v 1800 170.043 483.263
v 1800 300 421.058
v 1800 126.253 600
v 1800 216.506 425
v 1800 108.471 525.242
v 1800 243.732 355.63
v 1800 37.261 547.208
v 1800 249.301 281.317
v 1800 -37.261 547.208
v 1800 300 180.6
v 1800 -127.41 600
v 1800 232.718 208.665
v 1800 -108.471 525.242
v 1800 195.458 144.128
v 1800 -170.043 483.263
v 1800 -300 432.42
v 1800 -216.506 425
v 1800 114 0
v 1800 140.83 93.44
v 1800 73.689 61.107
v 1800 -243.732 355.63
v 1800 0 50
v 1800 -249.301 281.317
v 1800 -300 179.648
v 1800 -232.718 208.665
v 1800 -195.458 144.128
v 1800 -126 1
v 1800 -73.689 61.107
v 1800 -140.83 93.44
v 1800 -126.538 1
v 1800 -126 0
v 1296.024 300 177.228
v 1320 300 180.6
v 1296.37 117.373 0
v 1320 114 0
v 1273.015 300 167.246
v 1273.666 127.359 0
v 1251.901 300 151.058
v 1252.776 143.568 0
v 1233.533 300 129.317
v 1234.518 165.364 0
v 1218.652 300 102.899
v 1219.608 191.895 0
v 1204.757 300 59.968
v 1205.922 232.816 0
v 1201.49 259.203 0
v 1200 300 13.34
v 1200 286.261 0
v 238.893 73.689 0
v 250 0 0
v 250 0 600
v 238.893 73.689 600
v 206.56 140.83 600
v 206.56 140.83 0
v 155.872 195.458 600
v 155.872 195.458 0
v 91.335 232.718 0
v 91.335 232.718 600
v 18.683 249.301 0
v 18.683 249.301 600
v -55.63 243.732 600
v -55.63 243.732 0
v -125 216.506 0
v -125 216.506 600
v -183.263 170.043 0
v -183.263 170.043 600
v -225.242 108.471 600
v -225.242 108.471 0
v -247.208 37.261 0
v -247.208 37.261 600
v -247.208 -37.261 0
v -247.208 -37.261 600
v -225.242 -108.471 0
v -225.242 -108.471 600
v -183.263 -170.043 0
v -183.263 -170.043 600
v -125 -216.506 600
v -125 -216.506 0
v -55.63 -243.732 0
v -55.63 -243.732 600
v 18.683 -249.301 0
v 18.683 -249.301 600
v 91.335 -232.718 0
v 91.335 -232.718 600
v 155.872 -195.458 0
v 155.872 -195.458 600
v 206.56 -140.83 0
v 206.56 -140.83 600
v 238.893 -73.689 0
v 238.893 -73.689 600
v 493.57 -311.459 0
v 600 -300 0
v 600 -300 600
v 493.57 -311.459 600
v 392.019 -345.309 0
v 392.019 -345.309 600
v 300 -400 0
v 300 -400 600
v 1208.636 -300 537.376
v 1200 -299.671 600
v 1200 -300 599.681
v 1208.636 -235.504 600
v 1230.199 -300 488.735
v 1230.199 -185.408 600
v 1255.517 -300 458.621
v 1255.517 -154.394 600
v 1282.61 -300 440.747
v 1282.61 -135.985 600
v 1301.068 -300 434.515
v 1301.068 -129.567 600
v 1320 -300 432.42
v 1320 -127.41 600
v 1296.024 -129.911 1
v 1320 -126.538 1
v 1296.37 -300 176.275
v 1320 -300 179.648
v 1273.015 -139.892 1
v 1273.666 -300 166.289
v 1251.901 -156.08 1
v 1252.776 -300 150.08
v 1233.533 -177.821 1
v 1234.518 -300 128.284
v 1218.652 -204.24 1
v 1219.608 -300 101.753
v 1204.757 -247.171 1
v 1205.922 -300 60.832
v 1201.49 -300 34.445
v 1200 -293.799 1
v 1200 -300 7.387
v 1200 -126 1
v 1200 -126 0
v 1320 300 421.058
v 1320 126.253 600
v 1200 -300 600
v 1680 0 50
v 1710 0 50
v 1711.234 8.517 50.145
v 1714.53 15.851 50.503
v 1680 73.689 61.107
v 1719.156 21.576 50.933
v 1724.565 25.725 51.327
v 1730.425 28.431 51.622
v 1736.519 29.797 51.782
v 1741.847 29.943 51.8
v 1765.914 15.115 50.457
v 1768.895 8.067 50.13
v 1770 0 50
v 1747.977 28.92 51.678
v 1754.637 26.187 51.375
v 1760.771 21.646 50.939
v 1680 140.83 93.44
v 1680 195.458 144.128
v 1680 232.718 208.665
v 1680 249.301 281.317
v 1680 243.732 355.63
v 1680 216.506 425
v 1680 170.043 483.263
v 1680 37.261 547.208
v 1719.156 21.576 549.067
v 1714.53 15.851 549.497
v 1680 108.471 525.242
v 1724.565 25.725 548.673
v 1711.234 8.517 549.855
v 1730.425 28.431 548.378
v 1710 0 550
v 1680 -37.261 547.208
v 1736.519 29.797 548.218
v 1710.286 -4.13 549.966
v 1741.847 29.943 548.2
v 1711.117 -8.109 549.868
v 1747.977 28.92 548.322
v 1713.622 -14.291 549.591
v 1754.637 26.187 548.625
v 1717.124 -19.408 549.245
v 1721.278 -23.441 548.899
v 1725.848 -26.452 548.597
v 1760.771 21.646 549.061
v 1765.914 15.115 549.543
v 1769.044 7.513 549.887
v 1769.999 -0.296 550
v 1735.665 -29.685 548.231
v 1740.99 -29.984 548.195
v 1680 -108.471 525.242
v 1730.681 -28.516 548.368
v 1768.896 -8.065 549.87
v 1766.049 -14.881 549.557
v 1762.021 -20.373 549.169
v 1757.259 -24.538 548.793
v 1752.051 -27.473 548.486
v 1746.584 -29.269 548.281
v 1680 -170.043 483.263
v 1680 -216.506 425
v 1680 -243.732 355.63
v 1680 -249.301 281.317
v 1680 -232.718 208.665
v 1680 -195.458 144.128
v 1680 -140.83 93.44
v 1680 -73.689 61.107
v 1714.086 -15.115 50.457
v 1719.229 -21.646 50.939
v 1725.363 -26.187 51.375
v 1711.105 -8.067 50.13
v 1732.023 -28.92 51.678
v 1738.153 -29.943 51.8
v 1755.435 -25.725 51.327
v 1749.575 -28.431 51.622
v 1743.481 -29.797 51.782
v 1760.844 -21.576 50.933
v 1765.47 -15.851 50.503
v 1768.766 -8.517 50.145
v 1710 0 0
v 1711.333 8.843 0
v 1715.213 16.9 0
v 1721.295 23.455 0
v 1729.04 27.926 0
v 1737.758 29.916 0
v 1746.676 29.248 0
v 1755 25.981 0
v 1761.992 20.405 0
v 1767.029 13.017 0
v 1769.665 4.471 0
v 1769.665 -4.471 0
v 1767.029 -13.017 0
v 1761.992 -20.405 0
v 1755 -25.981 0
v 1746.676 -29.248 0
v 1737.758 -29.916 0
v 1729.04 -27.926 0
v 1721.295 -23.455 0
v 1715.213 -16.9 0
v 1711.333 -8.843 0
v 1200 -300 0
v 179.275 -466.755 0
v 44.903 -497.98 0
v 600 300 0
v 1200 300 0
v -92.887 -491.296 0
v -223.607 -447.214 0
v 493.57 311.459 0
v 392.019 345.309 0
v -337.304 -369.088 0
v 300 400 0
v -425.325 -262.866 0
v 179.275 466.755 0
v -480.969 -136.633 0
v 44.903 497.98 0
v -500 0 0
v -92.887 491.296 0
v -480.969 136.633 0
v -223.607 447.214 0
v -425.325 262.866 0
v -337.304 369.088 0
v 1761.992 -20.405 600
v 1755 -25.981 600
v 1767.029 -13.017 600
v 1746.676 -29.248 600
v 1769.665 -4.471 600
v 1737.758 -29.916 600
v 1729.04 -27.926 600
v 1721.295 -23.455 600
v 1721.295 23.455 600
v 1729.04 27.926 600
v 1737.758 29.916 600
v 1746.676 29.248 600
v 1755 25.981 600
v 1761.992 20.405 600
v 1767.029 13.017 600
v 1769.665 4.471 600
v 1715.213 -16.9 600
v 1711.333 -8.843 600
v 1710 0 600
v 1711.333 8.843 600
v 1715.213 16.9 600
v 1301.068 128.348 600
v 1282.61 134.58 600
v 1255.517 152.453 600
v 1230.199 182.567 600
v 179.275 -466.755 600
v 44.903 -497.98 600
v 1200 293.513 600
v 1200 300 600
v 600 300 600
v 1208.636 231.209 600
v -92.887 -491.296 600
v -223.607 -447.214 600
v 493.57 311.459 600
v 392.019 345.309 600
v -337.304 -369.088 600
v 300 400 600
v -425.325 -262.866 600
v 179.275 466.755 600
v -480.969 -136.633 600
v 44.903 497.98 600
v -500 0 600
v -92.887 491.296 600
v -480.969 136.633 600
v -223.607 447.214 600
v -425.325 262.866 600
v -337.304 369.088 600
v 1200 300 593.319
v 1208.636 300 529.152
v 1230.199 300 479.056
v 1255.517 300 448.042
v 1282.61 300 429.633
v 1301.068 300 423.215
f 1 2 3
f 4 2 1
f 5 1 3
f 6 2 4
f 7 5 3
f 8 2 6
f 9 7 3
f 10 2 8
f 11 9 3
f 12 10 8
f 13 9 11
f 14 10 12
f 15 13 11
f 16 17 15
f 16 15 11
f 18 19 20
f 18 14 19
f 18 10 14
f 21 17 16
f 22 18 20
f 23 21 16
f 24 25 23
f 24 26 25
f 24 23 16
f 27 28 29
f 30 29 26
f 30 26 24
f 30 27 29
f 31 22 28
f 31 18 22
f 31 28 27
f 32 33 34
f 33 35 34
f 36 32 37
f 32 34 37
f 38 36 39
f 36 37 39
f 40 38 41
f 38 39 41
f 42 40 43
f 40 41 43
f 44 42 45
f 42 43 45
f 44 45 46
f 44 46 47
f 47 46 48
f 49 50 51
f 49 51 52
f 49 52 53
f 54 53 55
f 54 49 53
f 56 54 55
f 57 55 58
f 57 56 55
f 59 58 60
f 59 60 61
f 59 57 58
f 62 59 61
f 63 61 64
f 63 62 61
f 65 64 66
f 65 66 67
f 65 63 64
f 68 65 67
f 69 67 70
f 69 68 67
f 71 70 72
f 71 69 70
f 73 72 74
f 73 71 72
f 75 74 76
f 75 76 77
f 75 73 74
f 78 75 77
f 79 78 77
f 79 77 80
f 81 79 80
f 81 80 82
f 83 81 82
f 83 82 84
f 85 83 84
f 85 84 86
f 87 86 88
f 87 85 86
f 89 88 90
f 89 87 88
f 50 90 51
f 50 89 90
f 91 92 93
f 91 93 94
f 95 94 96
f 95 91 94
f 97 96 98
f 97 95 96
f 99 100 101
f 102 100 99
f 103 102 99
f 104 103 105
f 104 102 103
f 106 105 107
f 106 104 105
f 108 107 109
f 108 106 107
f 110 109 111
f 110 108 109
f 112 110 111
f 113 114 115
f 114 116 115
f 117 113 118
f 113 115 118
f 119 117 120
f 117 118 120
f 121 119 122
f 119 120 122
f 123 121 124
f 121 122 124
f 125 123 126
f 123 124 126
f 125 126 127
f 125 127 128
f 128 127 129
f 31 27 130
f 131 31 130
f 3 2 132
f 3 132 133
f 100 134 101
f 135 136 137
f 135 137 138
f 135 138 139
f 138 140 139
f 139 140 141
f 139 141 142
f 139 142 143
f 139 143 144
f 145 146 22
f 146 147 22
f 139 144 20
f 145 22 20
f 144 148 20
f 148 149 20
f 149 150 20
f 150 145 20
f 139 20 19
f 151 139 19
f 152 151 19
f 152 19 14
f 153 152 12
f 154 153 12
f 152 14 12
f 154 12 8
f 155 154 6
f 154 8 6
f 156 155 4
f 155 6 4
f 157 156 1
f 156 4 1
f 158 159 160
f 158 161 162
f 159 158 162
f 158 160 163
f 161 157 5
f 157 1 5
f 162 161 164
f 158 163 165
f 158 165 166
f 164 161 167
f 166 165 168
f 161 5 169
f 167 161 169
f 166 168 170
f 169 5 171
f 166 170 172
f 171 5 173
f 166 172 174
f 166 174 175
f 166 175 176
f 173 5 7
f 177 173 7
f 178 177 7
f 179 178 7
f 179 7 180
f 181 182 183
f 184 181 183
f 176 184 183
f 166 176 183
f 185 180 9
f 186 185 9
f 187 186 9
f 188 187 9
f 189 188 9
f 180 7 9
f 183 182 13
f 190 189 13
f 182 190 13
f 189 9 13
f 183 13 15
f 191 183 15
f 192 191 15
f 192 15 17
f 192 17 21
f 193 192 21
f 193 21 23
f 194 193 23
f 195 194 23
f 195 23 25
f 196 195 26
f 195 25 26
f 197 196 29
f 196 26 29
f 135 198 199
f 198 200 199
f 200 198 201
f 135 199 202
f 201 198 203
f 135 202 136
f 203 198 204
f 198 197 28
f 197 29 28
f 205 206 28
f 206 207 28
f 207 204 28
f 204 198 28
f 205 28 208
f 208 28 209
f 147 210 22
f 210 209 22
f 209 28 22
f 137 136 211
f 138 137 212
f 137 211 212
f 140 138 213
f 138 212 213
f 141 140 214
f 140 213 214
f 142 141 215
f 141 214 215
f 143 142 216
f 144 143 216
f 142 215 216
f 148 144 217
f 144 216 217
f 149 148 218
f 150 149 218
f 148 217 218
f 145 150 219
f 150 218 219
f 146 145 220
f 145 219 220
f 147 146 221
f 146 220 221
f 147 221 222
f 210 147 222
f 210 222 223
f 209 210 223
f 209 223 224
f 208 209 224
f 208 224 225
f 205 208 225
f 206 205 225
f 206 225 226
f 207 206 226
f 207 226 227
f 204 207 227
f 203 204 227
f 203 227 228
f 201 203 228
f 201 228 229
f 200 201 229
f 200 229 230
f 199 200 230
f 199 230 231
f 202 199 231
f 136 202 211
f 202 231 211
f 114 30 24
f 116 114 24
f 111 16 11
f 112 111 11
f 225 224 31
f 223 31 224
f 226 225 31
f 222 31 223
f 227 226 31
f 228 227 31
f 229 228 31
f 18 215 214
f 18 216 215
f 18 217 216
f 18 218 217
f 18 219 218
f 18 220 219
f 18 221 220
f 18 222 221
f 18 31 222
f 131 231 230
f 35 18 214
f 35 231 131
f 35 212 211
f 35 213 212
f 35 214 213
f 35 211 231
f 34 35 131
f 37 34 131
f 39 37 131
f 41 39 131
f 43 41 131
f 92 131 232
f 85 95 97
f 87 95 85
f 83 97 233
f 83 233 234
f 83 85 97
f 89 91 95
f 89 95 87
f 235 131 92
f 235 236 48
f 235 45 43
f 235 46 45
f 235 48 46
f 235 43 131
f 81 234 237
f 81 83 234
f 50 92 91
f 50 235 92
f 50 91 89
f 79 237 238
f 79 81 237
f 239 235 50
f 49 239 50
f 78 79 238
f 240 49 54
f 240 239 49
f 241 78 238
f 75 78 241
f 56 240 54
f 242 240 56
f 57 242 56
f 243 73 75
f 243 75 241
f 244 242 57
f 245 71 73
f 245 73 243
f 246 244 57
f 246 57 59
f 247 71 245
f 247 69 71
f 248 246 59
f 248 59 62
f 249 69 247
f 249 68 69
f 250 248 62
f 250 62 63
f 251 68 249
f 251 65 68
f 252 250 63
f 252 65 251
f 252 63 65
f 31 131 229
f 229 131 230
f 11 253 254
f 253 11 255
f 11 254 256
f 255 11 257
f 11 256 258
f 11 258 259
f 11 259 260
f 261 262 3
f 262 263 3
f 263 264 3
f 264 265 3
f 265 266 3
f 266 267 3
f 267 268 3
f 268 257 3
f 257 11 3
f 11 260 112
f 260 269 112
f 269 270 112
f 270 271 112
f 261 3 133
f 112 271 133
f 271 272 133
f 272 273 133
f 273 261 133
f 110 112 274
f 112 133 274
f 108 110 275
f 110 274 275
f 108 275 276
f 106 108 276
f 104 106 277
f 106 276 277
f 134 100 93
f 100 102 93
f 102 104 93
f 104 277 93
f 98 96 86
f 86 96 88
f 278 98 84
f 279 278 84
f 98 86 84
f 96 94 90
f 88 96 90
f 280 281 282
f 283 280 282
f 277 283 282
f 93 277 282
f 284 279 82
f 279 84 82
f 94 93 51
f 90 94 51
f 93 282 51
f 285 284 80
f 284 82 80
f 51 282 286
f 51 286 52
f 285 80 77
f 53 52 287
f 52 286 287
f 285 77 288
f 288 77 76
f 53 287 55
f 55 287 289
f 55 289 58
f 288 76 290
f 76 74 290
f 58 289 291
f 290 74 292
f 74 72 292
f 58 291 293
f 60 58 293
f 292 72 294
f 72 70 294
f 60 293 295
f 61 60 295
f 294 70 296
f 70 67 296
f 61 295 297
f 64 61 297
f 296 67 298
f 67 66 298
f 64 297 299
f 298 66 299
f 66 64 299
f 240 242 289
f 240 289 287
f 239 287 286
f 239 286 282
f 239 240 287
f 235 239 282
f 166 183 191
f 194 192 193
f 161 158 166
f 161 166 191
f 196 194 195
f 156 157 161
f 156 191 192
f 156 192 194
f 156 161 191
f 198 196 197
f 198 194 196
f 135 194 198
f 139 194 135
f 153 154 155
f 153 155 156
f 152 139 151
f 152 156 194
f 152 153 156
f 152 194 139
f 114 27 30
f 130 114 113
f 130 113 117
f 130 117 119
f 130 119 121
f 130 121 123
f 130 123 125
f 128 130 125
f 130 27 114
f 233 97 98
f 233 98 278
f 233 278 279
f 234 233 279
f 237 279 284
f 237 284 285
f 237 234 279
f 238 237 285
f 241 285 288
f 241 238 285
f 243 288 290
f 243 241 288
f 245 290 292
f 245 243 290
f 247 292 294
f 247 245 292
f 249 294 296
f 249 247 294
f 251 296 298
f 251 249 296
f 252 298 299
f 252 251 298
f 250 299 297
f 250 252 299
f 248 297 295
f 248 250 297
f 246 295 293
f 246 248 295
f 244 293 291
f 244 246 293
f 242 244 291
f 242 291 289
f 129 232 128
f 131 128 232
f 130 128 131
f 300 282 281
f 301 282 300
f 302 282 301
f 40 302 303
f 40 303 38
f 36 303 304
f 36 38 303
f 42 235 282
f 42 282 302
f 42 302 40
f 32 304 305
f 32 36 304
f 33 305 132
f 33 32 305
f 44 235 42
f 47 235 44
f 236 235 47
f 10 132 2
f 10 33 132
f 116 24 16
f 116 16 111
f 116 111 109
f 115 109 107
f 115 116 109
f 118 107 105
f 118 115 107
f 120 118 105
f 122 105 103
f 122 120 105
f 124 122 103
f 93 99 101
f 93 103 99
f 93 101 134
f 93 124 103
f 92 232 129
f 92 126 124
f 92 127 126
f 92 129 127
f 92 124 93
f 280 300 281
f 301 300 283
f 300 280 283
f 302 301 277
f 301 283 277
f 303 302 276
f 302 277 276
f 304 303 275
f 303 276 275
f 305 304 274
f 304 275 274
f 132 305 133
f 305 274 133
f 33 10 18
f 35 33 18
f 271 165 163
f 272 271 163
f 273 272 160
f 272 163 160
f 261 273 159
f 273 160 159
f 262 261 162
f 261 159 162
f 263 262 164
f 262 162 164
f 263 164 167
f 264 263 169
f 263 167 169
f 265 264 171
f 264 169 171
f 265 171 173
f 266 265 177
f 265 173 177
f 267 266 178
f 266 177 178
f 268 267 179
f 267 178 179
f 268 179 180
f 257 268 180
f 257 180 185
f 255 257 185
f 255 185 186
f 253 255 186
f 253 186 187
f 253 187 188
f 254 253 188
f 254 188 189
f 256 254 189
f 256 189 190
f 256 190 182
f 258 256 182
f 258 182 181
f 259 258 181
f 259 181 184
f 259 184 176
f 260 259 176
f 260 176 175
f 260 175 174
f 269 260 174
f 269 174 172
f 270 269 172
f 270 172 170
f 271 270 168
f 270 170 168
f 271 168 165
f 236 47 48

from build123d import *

# Parameters (mm, degrees)
SKETCH1_R              = 250
BOSS_EXTRUDE1_DEPTH    = 600
CUT_EXTRUDE6_DEPTH     = 600
CUT_EXTRUDE8_START     = -1
CUT_EXTRUDE8_OUTLINE_W = 600
CUT_EXTRUDE8_OUTLINE_H = 174.000412652
CUT_EXTRUDE8_DEPTH     = 1
FILLET2_R              = 120
SKETCH8_R              = 250
CUT_EXTRUDE10_DEPTH    = 120
SKETCH9_R              = 30
CUT_EXTRUDE11_DEPTH    = 1963.141687035


# Read off the part's stored shape, not the designer's step: Cut-Extrude8
with BuildPart() as part:
    # Sketch1 → Boss-Extrude1 (new body)
    with BuildSketch(Plane.XY):
        with BuildLine():
            Line((600, 300), (1800, 300))
            Line((1800, 300), (1800, -300))
            Line((1800, -300), (600, -300))
            ThreePointArc((600, -300), (441.886116992, -325.658350975), (300, -400))
            ThreePointArc((300, -400), (-500, 0), (300, 400))
            ThreePointArc((300, 400), (441.886116992, 325.658350975), (600, 300))
        make_face()
        Circle(SKETCH1_R, mode=Mode.SUBTRACT)
    extrude(amount=BOSS_EXTRUDE1_DEPTH)

    # Sketch2 → Cut-Extrude6 (cut)
    with BuildSketch(Plane(origin=(1800, 0, 0), x_dir=(0, 0, -1), z_dir=(1, 0, 0))):
        Polygon((-180.6, 300), (0, 114), (0, 300), align=None)
        Polygon((-600, -300), (-432.420494682, -300), (-600, -127.409811799), align=None)
        Polygon((-0.445053521, -300), (-0.445053521, -125.999587348), (-179.648136318, -300), align=None)
        Polygon((-606.599587348, 119.845053521), (-606.599587348, 300.445053521), (-420.599587348, 300.445053521), align=None)
    extrude(amount=-CUT_EXTRUDE6_DEPTH, mode=Mode.SUBTRACT)

    # Cut-Extrude8 outline → Cut-Extrude8 (cut)
    with BuildSketch(Plane(origin=(0, 0, 0), x_dir=(-1, 0, 0), z_dir=(0, 0, -1)).offset(CUT_EXTRUDE8_START)):
        with Locations((-1500, -212.999793674)):
            Rectangle(CUT_EXTRUDE8_OUTLINE_W, CUT_EXTRUDE8_OUTLINE_H)
    extrude(amount=CUT_EXTRUDE8_DEPTH, mode=Mode.SUBTRACT)

    # Fillet2
    fillet2_edges = [part.edges().sort_by_distance(p)[0] for p in [
        (1200, 213.126519973, 510.528974059),
        (1200, -213.269211239, 90.324068159),
        (1200, -213.7049059, 516.210247341),
        (1200, 207, 90.3),
    ]]
    fillet(fillet2_edges, radius=FILLET2_R)

    # Sketch8 → Cut-Extrude10 (cut)
    with BuildSketch(Plane(origin=(1800, 0, 0), x_dir=(0, 0, -1), z_dir=(1, 0, 0))):
        with Locations((-300, 0)):
            Circle(SKETCH8_R)
    extrude(amount=-CUT_EXTRUDE10_DEPTH, mode=Mode.SUBTRACT)

    # Sketch9 → Cut-Extrude11 (cut, through all)
    with BuildSketch(Plane(origin=(0, 0, 0), x_dir=(-1, 0, 0), z_dir=(0, 0, -1))):
        with Locations((-1740, 0)):
            Circle(SKETCH9_R)
    extrude(amount=-CUT_EXTRUDE11_DEPTH, mode=Mode.SUBTRACT)


solid = part.part
